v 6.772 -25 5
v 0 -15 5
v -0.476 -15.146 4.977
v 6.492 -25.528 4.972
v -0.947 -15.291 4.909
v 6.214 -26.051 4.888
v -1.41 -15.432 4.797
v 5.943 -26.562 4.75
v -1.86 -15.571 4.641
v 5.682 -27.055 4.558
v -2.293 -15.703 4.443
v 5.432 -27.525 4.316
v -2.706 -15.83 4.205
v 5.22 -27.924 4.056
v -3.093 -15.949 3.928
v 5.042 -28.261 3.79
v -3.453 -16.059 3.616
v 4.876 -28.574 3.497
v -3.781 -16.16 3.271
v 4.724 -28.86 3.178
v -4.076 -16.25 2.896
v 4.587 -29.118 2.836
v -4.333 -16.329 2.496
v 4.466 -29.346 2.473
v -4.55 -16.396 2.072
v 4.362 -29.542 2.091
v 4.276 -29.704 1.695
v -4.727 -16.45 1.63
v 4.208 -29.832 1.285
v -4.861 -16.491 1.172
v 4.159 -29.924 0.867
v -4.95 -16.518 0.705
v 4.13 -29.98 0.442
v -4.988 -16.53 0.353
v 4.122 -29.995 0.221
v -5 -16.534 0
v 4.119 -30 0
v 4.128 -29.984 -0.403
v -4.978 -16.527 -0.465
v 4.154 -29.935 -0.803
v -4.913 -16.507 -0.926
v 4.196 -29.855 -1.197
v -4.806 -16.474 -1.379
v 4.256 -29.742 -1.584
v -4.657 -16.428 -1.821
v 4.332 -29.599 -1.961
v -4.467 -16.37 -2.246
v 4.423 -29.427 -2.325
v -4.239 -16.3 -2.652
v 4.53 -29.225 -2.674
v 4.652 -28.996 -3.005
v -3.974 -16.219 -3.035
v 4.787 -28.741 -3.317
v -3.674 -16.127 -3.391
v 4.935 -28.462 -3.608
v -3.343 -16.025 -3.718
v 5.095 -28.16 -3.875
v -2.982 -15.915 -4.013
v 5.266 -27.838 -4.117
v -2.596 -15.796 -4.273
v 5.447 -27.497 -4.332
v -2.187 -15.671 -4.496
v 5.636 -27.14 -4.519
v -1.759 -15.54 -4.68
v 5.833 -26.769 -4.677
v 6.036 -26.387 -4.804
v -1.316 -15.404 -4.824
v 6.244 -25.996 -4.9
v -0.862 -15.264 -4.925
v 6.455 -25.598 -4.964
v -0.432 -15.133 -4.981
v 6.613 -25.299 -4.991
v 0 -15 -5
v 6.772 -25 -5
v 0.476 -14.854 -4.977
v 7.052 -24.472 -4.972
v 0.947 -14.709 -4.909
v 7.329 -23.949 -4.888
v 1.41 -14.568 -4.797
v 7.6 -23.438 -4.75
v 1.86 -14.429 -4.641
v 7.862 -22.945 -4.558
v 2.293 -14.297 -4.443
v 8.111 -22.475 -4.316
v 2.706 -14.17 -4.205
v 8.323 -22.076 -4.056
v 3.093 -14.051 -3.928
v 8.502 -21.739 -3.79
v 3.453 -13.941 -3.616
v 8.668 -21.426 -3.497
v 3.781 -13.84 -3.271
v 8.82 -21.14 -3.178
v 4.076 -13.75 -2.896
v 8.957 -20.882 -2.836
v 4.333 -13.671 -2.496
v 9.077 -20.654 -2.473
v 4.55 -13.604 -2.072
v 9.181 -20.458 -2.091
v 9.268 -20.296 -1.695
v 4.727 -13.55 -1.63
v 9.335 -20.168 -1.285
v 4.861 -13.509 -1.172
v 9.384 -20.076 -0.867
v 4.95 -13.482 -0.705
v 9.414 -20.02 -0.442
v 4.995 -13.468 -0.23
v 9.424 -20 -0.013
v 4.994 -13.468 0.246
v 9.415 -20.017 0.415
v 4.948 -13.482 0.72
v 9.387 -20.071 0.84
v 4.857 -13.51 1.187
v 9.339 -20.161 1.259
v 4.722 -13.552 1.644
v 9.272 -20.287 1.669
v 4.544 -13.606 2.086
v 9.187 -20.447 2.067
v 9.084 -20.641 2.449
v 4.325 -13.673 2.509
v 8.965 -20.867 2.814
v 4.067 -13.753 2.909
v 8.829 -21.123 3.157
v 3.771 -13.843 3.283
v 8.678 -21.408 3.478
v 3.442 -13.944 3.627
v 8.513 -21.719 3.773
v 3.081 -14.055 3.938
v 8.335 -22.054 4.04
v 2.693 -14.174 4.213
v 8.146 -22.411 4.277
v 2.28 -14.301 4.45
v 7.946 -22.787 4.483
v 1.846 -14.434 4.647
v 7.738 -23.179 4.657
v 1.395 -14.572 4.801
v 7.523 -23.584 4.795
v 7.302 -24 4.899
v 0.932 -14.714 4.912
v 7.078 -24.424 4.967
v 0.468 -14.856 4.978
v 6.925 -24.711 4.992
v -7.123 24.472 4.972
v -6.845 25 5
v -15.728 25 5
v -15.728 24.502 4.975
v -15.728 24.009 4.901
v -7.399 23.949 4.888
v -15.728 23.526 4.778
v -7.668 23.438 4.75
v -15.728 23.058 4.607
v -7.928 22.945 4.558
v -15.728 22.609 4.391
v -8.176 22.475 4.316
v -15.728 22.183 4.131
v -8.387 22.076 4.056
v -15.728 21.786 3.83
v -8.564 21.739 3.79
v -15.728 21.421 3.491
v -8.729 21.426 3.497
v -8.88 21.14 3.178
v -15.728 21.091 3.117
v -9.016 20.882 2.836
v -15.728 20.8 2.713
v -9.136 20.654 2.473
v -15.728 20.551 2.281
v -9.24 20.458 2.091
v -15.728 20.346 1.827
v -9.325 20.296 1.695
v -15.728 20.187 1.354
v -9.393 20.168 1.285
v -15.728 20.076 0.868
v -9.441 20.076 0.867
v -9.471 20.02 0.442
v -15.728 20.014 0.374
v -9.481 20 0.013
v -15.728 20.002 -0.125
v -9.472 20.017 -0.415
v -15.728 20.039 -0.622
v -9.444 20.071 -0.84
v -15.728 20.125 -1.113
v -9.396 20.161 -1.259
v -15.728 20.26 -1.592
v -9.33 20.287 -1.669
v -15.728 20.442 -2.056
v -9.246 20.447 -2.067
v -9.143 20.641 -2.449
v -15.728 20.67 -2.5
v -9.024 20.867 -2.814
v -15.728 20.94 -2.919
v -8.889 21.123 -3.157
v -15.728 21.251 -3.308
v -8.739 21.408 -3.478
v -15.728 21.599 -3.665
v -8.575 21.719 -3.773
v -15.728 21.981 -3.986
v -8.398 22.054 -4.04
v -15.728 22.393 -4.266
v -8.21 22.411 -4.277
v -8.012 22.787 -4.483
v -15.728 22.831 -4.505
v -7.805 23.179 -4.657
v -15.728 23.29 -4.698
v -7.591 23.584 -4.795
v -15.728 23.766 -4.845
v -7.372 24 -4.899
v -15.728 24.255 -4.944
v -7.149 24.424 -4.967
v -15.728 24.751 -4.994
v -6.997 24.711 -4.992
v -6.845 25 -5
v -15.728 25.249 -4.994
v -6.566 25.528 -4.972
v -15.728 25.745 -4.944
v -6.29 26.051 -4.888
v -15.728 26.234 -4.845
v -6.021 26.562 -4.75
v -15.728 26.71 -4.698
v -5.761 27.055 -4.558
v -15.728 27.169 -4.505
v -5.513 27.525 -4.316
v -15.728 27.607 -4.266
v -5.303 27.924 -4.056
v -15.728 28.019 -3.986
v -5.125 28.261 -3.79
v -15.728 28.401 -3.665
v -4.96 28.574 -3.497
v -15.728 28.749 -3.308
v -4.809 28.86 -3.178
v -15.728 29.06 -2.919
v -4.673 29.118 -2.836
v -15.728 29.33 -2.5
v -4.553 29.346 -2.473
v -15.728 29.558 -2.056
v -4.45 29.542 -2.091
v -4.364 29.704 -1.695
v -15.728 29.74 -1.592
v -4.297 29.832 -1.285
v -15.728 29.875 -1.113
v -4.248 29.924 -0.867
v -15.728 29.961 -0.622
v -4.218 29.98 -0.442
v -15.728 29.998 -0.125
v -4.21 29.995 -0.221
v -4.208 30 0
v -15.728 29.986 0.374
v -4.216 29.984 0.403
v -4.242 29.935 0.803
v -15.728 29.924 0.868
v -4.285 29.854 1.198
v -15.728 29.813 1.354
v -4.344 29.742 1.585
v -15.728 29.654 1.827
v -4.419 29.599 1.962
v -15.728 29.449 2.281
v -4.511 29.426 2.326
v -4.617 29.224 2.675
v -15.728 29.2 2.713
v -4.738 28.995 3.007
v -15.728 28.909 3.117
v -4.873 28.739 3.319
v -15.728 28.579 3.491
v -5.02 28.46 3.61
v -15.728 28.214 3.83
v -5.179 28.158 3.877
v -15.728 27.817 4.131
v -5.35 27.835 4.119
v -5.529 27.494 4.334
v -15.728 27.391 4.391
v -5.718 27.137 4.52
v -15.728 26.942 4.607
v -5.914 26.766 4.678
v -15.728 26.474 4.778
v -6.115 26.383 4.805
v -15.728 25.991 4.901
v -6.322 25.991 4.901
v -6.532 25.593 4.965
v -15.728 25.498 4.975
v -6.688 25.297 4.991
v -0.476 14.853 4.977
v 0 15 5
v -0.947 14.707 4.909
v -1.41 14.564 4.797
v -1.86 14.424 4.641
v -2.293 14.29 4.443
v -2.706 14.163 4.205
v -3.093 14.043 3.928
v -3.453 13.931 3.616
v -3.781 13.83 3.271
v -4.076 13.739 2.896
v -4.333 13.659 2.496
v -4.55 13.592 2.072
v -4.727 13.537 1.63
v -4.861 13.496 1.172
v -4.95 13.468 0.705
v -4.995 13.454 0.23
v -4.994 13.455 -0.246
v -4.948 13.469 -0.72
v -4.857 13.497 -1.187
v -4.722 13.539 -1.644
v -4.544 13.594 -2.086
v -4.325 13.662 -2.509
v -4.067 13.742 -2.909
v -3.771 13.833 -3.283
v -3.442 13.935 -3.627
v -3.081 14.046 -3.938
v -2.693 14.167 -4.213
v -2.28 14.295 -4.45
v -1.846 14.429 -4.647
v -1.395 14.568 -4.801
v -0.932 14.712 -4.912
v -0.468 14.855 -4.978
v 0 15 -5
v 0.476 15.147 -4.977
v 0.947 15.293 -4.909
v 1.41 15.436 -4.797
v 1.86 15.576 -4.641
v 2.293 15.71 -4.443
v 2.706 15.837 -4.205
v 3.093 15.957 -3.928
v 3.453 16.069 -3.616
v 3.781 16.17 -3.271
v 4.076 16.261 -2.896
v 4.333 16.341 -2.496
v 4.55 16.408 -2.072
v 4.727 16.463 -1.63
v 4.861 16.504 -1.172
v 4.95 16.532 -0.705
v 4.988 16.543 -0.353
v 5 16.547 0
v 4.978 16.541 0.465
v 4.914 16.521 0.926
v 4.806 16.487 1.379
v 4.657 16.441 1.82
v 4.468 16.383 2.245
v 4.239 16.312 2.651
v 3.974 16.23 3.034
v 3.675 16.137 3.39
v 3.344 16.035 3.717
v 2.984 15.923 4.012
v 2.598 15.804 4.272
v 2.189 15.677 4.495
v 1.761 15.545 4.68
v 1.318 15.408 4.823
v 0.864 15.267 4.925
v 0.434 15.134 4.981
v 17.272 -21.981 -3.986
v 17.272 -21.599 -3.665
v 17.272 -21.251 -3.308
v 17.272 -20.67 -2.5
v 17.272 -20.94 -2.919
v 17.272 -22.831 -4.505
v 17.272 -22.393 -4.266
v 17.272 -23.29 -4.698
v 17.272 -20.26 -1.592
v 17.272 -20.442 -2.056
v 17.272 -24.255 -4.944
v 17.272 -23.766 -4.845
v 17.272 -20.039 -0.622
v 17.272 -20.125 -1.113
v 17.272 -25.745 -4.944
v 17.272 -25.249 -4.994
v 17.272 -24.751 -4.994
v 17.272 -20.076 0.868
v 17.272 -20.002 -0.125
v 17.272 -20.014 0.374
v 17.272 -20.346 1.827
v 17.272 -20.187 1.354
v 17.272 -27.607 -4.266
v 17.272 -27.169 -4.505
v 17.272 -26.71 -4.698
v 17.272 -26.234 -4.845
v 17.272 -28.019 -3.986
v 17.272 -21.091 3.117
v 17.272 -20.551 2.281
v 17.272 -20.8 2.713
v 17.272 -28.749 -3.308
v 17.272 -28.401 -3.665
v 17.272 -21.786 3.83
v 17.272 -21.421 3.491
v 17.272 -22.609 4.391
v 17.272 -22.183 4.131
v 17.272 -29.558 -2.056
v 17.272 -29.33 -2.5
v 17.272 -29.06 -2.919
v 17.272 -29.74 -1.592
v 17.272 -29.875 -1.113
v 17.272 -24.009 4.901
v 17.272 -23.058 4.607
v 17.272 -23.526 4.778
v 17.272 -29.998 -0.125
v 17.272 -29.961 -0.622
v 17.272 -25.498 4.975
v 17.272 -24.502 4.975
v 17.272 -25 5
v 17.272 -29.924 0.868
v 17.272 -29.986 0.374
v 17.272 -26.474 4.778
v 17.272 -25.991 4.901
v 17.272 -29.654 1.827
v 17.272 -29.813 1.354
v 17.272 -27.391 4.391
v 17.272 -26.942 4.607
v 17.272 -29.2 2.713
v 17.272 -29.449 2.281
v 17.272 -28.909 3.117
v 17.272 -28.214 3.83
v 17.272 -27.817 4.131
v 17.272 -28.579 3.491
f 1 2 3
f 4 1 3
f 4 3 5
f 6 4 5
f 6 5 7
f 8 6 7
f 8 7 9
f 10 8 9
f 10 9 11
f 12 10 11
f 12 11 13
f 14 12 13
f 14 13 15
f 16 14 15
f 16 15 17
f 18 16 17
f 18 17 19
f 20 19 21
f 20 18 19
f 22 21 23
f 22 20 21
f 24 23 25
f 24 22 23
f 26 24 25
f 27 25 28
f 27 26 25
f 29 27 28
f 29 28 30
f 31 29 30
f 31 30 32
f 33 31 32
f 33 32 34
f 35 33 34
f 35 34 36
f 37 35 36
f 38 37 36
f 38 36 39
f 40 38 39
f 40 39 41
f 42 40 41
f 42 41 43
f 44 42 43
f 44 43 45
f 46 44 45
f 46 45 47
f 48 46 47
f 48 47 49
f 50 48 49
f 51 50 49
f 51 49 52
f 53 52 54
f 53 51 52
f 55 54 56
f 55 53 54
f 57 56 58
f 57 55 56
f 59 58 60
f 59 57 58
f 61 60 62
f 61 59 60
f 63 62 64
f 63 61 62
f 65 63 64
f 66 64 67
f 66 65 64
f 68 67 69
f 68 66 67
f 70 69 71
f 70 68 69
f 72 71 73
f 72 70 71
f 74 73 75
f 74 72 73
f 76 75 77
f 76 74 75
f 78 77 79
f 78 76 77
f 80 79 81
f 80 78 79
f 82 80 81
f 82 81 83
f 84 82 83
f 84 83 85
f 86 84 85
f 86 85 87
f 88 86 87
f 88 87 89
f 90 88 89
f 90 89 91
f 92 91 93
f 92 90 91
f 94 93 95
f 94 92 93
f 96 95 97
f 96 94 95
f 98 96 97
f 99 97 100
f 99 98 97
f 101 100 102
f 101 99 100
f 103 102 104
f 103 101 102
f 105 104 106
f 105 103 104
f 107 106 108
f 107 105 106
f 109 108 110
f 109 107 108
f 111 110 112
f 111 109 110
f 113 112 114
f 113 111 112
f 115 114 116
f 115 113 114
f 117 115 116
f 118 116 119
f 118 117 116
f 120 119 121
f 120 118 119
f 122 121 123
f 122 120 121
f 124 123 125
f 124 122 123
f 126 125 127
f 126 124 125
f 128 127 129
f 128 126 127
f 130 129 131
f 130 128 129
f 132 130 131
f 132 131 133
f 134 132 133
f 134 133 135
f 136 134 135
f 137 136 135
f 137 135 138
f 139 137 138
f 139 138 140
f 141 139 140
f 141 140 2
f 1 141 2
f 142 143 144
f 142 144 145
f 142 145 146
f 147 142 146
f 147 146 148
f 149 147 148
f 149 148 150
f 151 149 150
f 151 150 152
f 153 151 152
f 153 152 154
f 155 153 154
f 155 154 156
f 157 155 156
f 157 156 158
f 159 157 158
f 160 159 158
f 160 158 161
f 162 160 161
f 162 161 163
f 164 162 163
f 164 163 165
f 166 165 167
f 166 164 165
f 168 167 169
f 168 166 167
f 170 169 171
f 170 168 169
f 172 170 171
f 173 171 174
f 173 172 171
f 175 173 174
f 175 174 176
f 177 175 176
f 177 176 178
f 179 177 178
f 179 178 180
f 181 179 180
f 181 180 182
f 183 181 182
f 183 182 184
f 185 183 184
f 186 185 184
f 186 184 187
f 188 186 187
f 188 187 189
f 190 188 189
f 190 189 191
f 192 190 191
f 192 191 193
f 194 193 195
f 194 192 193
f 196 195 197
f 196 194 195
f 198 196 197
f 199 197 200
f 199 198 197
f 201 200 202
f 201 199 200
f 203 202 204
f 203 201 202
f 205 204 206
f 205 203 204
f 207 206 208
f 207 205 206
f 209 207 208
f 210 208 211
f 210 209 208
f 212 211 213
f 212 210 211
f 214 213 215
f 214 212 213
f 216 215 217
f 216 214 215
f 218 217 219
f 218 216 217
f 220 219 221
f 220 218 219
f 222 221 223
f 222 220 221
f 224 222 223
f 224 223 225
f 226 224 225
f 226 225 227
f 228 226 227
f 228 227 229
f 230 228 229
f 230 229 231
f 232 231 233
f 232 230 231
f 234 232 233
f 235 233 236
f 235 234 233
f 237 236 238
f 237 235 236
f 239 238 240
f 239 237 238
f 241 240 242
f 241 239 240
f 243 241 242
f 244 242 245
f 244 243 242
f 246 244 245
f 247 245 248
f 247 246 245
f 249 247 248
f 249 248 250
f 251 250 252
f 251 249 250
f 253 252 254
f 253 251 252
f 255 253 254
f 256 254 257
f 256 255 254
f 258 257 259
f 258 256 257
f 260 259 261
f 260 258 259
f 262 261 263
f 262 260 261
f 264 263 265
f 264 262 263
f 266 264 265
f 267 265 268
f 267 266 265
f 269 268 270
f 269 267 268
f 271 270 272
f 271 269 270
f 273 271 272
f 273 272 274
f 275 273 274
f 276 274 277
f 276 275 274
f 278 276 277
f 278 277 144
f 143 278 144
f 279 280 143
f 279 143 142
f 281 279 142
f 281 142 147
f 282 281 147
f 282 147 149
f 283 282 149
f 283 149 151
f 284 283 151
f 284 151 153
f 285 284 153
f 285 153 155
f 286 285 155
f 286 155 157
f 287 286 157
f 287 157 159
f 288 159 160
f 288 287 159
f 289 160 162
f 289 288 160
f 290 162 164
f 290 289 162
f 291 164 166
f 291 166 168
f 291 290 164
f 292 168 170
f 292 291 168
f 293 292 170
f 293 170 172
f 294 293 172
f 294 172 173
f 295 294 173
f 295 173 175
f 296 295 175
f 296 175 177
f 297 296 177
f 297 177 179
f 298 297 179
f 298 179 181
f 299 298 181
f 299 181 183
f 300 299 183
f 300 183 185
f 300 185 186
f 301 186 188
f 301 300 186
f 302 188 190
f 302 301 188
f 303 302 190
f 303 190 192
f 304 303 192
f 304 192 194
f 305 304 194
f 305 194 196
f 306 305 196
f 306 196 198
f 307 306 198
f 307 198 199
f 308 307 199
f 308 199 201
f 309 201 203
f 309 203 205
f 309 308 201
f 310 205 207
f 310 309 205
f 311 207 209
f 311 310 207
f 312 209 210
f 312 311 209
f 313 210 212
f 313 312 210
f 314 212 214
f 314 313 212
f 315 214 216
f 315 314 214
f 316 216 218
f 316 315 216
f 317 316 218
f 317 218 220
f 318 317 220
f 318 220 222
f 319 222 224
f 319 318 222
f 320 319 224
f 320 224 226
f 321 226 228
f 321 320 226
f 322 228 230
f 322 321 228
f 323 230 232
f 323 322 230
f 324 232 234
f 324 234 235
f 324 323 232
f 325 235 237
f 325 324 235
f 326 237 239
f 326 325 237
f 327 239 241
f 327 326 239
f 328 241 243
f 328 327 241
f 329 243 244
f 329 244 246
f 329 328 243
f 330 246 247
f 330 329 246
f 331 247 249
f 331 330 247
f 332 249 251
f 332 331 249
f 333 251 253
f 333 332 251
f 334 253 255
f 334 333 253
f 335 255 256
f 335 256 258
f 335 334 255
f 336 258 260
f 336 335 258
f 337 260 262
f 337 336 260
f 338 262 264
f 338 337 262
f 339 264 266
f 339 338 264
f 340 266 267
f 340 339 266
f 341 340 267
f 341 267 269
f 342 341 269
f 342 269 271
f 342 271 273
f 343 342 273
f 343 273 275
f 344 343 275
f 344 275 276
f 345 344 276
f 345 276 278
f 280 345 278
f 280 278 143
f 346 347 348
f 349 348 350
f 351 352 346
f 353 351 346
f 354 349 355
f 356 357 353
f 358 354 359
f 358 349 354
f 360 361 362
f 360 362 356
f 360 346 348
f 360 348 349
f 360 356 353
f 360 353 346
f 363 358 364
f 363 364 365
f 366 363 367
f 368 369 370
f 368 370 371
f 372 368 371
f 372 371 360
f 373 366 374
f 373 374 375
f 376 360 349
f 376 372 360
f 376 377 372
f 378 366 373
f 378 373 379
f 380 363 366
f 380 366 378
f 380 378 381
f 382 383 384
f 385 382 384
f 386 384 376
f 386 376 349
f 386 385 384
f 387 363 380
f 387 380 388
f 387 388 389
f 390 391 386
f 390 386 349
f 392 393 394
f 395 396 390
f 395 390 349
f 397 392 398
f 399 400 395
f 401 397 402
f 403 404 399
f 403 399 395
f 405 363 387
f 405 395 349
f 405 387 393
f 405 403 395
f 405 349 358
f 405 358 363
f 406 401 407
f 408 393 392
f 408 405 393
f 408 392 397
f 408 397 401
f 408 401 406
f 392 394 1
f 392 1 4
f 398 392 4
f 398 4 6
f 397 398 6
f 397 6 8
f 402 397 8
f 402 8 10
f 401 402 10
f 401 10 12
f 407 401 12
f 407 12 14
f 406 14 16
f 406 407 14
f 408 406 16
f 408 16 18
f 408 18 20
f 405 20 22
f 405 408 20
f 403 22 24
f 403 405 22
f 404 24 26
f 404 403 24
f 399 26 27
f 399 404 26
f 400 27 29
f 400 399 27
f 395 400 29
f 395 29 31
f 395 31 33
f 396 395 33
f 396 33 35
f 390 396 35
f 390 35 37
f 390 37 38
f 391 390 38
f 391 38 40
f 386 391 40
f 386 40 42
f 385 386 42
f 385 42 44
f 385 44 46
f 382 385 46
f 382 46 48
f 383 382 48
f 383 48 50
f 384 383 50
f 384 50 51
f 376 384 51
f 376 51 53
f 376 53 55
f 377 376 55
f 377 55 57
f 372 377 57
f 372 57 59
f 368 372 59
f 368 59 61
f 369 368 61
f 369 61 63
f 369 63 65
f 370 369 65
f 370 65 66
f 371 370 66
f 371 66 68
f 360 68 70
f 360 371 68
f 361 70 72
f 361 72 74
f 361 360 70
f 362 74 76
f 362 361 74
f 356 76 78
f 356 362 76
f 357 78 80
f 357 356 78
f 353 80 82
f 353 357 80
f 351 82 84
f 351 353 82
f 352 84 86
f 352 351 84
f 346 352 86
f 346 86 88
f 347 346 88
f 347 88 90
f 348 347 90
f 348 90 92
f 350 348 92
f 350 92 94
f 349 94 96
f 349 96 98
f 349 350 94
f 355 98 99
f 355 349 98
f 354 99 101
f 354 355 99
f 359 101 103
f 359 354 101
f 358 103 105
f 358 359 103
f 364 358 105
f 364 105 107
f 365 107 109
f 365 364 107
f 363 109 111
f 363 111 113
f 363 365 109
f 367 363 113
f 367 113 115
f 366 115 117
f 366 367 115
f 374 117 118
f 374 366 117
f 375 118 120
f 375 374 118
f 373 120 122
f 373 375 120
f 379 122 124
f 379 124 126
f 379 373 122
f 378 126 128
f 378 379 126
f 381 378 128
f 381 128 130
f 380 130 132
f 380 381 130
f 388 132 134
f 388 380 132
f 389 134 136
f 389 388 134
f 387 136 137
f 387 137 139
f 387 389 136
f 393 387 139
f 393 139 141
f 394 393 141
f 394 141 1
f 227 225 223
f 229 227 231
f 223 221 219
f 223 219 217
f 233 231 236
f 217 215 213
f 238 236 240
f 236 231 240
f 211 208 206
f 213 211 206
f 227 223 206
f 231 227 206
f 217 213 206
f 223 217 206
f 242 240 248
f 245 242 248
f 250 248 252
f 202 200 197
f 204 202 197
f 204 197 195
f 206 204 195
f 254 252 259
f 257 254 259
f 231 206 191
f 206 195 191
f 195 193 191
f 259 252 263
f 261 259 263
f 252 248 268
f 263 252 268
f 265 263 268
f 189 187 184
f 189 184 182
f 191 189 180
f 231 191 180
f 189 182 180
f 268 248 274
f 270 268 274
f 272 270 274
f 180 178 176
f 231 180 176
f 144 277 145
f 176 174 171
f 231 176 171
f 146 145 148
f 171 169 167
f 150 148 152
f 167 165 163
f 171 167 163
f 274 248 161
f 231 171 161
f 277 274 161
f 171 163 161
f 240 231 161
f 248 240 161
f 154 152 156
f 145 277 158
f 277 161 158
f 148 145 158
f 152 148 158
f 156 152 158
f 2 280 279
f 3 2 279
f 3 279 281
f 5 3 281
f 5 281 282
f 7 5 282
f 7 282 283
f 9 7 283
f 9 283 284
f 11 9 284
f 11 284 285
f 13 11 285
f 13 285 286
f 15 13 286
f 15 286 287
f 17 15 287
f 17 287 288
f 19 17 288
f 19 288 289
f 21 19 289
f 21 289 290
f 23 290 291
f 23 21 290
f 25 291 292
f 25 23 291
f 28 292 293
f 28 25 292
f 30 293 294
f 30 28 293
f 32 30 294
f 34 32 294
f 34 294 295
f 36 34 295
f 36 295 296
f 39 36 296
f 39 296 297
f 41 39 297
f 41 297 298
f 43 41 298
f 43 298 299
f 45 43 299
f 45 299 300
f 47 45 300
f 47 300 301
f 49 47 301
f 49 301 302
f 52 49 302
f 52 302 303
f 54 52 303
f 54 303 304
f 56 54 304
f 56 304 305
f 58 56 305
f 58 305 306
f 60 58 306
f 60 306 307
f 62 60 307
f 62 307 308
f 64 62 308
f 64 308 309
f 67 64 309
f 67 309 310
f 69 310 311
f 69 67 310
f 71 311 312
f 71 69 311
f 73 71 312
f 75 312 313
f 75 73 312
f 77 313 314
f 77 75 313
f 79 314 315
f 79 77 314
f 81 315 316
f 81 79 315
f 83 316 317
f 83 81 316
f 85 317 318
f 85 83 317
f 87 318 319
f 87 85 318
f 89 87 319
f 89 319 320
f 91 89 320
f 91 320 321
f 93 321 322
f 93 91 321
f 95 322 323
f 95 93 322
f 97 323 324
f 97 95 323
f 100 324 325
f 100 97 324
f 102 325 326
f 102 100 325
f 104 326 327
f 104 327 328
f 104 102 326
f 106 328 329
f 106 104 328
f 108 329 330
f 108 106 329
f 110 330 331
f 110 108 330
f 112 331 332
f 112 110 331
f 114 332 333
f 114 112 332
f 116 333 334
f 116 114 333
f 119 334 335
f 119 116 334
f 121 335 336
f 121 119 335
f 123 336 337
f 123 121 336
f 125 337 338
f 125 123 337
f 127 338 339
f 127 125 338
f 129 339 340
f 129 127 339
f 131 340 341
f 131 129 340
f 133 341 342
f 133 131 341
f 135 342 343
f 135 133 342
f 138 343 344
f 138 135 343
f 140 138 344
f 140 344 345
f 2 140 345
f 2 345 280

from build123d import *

# Parameters (mm, degrees)
SWEEP1_PROFILE_R = 5


with BuildPart() as part:
    # Sweep1: sweep along a path in Sketch1
    with BuildLine(Plane.XY) as sweep1_path:
        Line((-15.72815534, 25), (-6.844660194, 25))
        Line((-6.844660194, 25), (0, 15))
        Line((0, 15), (0, -15))
        Line((0, -15), (6.77184466, -25))
        Line((6.77184466, -25), (17.27184466, -25))
    # Sweep1 profile (on start of the path) → Sweep1 (sweep)
    with BuildSketch(Plane(origin=(-15.72815534, 25, 0), x_dir=(0, 0, 1), z_dir=(1, 0, 0))):
        Circle(SWEEP1_PROFILE_R)
    sweep(path=sweep1_path.line, transition=Transition.RIGHT)


solid = part.part
